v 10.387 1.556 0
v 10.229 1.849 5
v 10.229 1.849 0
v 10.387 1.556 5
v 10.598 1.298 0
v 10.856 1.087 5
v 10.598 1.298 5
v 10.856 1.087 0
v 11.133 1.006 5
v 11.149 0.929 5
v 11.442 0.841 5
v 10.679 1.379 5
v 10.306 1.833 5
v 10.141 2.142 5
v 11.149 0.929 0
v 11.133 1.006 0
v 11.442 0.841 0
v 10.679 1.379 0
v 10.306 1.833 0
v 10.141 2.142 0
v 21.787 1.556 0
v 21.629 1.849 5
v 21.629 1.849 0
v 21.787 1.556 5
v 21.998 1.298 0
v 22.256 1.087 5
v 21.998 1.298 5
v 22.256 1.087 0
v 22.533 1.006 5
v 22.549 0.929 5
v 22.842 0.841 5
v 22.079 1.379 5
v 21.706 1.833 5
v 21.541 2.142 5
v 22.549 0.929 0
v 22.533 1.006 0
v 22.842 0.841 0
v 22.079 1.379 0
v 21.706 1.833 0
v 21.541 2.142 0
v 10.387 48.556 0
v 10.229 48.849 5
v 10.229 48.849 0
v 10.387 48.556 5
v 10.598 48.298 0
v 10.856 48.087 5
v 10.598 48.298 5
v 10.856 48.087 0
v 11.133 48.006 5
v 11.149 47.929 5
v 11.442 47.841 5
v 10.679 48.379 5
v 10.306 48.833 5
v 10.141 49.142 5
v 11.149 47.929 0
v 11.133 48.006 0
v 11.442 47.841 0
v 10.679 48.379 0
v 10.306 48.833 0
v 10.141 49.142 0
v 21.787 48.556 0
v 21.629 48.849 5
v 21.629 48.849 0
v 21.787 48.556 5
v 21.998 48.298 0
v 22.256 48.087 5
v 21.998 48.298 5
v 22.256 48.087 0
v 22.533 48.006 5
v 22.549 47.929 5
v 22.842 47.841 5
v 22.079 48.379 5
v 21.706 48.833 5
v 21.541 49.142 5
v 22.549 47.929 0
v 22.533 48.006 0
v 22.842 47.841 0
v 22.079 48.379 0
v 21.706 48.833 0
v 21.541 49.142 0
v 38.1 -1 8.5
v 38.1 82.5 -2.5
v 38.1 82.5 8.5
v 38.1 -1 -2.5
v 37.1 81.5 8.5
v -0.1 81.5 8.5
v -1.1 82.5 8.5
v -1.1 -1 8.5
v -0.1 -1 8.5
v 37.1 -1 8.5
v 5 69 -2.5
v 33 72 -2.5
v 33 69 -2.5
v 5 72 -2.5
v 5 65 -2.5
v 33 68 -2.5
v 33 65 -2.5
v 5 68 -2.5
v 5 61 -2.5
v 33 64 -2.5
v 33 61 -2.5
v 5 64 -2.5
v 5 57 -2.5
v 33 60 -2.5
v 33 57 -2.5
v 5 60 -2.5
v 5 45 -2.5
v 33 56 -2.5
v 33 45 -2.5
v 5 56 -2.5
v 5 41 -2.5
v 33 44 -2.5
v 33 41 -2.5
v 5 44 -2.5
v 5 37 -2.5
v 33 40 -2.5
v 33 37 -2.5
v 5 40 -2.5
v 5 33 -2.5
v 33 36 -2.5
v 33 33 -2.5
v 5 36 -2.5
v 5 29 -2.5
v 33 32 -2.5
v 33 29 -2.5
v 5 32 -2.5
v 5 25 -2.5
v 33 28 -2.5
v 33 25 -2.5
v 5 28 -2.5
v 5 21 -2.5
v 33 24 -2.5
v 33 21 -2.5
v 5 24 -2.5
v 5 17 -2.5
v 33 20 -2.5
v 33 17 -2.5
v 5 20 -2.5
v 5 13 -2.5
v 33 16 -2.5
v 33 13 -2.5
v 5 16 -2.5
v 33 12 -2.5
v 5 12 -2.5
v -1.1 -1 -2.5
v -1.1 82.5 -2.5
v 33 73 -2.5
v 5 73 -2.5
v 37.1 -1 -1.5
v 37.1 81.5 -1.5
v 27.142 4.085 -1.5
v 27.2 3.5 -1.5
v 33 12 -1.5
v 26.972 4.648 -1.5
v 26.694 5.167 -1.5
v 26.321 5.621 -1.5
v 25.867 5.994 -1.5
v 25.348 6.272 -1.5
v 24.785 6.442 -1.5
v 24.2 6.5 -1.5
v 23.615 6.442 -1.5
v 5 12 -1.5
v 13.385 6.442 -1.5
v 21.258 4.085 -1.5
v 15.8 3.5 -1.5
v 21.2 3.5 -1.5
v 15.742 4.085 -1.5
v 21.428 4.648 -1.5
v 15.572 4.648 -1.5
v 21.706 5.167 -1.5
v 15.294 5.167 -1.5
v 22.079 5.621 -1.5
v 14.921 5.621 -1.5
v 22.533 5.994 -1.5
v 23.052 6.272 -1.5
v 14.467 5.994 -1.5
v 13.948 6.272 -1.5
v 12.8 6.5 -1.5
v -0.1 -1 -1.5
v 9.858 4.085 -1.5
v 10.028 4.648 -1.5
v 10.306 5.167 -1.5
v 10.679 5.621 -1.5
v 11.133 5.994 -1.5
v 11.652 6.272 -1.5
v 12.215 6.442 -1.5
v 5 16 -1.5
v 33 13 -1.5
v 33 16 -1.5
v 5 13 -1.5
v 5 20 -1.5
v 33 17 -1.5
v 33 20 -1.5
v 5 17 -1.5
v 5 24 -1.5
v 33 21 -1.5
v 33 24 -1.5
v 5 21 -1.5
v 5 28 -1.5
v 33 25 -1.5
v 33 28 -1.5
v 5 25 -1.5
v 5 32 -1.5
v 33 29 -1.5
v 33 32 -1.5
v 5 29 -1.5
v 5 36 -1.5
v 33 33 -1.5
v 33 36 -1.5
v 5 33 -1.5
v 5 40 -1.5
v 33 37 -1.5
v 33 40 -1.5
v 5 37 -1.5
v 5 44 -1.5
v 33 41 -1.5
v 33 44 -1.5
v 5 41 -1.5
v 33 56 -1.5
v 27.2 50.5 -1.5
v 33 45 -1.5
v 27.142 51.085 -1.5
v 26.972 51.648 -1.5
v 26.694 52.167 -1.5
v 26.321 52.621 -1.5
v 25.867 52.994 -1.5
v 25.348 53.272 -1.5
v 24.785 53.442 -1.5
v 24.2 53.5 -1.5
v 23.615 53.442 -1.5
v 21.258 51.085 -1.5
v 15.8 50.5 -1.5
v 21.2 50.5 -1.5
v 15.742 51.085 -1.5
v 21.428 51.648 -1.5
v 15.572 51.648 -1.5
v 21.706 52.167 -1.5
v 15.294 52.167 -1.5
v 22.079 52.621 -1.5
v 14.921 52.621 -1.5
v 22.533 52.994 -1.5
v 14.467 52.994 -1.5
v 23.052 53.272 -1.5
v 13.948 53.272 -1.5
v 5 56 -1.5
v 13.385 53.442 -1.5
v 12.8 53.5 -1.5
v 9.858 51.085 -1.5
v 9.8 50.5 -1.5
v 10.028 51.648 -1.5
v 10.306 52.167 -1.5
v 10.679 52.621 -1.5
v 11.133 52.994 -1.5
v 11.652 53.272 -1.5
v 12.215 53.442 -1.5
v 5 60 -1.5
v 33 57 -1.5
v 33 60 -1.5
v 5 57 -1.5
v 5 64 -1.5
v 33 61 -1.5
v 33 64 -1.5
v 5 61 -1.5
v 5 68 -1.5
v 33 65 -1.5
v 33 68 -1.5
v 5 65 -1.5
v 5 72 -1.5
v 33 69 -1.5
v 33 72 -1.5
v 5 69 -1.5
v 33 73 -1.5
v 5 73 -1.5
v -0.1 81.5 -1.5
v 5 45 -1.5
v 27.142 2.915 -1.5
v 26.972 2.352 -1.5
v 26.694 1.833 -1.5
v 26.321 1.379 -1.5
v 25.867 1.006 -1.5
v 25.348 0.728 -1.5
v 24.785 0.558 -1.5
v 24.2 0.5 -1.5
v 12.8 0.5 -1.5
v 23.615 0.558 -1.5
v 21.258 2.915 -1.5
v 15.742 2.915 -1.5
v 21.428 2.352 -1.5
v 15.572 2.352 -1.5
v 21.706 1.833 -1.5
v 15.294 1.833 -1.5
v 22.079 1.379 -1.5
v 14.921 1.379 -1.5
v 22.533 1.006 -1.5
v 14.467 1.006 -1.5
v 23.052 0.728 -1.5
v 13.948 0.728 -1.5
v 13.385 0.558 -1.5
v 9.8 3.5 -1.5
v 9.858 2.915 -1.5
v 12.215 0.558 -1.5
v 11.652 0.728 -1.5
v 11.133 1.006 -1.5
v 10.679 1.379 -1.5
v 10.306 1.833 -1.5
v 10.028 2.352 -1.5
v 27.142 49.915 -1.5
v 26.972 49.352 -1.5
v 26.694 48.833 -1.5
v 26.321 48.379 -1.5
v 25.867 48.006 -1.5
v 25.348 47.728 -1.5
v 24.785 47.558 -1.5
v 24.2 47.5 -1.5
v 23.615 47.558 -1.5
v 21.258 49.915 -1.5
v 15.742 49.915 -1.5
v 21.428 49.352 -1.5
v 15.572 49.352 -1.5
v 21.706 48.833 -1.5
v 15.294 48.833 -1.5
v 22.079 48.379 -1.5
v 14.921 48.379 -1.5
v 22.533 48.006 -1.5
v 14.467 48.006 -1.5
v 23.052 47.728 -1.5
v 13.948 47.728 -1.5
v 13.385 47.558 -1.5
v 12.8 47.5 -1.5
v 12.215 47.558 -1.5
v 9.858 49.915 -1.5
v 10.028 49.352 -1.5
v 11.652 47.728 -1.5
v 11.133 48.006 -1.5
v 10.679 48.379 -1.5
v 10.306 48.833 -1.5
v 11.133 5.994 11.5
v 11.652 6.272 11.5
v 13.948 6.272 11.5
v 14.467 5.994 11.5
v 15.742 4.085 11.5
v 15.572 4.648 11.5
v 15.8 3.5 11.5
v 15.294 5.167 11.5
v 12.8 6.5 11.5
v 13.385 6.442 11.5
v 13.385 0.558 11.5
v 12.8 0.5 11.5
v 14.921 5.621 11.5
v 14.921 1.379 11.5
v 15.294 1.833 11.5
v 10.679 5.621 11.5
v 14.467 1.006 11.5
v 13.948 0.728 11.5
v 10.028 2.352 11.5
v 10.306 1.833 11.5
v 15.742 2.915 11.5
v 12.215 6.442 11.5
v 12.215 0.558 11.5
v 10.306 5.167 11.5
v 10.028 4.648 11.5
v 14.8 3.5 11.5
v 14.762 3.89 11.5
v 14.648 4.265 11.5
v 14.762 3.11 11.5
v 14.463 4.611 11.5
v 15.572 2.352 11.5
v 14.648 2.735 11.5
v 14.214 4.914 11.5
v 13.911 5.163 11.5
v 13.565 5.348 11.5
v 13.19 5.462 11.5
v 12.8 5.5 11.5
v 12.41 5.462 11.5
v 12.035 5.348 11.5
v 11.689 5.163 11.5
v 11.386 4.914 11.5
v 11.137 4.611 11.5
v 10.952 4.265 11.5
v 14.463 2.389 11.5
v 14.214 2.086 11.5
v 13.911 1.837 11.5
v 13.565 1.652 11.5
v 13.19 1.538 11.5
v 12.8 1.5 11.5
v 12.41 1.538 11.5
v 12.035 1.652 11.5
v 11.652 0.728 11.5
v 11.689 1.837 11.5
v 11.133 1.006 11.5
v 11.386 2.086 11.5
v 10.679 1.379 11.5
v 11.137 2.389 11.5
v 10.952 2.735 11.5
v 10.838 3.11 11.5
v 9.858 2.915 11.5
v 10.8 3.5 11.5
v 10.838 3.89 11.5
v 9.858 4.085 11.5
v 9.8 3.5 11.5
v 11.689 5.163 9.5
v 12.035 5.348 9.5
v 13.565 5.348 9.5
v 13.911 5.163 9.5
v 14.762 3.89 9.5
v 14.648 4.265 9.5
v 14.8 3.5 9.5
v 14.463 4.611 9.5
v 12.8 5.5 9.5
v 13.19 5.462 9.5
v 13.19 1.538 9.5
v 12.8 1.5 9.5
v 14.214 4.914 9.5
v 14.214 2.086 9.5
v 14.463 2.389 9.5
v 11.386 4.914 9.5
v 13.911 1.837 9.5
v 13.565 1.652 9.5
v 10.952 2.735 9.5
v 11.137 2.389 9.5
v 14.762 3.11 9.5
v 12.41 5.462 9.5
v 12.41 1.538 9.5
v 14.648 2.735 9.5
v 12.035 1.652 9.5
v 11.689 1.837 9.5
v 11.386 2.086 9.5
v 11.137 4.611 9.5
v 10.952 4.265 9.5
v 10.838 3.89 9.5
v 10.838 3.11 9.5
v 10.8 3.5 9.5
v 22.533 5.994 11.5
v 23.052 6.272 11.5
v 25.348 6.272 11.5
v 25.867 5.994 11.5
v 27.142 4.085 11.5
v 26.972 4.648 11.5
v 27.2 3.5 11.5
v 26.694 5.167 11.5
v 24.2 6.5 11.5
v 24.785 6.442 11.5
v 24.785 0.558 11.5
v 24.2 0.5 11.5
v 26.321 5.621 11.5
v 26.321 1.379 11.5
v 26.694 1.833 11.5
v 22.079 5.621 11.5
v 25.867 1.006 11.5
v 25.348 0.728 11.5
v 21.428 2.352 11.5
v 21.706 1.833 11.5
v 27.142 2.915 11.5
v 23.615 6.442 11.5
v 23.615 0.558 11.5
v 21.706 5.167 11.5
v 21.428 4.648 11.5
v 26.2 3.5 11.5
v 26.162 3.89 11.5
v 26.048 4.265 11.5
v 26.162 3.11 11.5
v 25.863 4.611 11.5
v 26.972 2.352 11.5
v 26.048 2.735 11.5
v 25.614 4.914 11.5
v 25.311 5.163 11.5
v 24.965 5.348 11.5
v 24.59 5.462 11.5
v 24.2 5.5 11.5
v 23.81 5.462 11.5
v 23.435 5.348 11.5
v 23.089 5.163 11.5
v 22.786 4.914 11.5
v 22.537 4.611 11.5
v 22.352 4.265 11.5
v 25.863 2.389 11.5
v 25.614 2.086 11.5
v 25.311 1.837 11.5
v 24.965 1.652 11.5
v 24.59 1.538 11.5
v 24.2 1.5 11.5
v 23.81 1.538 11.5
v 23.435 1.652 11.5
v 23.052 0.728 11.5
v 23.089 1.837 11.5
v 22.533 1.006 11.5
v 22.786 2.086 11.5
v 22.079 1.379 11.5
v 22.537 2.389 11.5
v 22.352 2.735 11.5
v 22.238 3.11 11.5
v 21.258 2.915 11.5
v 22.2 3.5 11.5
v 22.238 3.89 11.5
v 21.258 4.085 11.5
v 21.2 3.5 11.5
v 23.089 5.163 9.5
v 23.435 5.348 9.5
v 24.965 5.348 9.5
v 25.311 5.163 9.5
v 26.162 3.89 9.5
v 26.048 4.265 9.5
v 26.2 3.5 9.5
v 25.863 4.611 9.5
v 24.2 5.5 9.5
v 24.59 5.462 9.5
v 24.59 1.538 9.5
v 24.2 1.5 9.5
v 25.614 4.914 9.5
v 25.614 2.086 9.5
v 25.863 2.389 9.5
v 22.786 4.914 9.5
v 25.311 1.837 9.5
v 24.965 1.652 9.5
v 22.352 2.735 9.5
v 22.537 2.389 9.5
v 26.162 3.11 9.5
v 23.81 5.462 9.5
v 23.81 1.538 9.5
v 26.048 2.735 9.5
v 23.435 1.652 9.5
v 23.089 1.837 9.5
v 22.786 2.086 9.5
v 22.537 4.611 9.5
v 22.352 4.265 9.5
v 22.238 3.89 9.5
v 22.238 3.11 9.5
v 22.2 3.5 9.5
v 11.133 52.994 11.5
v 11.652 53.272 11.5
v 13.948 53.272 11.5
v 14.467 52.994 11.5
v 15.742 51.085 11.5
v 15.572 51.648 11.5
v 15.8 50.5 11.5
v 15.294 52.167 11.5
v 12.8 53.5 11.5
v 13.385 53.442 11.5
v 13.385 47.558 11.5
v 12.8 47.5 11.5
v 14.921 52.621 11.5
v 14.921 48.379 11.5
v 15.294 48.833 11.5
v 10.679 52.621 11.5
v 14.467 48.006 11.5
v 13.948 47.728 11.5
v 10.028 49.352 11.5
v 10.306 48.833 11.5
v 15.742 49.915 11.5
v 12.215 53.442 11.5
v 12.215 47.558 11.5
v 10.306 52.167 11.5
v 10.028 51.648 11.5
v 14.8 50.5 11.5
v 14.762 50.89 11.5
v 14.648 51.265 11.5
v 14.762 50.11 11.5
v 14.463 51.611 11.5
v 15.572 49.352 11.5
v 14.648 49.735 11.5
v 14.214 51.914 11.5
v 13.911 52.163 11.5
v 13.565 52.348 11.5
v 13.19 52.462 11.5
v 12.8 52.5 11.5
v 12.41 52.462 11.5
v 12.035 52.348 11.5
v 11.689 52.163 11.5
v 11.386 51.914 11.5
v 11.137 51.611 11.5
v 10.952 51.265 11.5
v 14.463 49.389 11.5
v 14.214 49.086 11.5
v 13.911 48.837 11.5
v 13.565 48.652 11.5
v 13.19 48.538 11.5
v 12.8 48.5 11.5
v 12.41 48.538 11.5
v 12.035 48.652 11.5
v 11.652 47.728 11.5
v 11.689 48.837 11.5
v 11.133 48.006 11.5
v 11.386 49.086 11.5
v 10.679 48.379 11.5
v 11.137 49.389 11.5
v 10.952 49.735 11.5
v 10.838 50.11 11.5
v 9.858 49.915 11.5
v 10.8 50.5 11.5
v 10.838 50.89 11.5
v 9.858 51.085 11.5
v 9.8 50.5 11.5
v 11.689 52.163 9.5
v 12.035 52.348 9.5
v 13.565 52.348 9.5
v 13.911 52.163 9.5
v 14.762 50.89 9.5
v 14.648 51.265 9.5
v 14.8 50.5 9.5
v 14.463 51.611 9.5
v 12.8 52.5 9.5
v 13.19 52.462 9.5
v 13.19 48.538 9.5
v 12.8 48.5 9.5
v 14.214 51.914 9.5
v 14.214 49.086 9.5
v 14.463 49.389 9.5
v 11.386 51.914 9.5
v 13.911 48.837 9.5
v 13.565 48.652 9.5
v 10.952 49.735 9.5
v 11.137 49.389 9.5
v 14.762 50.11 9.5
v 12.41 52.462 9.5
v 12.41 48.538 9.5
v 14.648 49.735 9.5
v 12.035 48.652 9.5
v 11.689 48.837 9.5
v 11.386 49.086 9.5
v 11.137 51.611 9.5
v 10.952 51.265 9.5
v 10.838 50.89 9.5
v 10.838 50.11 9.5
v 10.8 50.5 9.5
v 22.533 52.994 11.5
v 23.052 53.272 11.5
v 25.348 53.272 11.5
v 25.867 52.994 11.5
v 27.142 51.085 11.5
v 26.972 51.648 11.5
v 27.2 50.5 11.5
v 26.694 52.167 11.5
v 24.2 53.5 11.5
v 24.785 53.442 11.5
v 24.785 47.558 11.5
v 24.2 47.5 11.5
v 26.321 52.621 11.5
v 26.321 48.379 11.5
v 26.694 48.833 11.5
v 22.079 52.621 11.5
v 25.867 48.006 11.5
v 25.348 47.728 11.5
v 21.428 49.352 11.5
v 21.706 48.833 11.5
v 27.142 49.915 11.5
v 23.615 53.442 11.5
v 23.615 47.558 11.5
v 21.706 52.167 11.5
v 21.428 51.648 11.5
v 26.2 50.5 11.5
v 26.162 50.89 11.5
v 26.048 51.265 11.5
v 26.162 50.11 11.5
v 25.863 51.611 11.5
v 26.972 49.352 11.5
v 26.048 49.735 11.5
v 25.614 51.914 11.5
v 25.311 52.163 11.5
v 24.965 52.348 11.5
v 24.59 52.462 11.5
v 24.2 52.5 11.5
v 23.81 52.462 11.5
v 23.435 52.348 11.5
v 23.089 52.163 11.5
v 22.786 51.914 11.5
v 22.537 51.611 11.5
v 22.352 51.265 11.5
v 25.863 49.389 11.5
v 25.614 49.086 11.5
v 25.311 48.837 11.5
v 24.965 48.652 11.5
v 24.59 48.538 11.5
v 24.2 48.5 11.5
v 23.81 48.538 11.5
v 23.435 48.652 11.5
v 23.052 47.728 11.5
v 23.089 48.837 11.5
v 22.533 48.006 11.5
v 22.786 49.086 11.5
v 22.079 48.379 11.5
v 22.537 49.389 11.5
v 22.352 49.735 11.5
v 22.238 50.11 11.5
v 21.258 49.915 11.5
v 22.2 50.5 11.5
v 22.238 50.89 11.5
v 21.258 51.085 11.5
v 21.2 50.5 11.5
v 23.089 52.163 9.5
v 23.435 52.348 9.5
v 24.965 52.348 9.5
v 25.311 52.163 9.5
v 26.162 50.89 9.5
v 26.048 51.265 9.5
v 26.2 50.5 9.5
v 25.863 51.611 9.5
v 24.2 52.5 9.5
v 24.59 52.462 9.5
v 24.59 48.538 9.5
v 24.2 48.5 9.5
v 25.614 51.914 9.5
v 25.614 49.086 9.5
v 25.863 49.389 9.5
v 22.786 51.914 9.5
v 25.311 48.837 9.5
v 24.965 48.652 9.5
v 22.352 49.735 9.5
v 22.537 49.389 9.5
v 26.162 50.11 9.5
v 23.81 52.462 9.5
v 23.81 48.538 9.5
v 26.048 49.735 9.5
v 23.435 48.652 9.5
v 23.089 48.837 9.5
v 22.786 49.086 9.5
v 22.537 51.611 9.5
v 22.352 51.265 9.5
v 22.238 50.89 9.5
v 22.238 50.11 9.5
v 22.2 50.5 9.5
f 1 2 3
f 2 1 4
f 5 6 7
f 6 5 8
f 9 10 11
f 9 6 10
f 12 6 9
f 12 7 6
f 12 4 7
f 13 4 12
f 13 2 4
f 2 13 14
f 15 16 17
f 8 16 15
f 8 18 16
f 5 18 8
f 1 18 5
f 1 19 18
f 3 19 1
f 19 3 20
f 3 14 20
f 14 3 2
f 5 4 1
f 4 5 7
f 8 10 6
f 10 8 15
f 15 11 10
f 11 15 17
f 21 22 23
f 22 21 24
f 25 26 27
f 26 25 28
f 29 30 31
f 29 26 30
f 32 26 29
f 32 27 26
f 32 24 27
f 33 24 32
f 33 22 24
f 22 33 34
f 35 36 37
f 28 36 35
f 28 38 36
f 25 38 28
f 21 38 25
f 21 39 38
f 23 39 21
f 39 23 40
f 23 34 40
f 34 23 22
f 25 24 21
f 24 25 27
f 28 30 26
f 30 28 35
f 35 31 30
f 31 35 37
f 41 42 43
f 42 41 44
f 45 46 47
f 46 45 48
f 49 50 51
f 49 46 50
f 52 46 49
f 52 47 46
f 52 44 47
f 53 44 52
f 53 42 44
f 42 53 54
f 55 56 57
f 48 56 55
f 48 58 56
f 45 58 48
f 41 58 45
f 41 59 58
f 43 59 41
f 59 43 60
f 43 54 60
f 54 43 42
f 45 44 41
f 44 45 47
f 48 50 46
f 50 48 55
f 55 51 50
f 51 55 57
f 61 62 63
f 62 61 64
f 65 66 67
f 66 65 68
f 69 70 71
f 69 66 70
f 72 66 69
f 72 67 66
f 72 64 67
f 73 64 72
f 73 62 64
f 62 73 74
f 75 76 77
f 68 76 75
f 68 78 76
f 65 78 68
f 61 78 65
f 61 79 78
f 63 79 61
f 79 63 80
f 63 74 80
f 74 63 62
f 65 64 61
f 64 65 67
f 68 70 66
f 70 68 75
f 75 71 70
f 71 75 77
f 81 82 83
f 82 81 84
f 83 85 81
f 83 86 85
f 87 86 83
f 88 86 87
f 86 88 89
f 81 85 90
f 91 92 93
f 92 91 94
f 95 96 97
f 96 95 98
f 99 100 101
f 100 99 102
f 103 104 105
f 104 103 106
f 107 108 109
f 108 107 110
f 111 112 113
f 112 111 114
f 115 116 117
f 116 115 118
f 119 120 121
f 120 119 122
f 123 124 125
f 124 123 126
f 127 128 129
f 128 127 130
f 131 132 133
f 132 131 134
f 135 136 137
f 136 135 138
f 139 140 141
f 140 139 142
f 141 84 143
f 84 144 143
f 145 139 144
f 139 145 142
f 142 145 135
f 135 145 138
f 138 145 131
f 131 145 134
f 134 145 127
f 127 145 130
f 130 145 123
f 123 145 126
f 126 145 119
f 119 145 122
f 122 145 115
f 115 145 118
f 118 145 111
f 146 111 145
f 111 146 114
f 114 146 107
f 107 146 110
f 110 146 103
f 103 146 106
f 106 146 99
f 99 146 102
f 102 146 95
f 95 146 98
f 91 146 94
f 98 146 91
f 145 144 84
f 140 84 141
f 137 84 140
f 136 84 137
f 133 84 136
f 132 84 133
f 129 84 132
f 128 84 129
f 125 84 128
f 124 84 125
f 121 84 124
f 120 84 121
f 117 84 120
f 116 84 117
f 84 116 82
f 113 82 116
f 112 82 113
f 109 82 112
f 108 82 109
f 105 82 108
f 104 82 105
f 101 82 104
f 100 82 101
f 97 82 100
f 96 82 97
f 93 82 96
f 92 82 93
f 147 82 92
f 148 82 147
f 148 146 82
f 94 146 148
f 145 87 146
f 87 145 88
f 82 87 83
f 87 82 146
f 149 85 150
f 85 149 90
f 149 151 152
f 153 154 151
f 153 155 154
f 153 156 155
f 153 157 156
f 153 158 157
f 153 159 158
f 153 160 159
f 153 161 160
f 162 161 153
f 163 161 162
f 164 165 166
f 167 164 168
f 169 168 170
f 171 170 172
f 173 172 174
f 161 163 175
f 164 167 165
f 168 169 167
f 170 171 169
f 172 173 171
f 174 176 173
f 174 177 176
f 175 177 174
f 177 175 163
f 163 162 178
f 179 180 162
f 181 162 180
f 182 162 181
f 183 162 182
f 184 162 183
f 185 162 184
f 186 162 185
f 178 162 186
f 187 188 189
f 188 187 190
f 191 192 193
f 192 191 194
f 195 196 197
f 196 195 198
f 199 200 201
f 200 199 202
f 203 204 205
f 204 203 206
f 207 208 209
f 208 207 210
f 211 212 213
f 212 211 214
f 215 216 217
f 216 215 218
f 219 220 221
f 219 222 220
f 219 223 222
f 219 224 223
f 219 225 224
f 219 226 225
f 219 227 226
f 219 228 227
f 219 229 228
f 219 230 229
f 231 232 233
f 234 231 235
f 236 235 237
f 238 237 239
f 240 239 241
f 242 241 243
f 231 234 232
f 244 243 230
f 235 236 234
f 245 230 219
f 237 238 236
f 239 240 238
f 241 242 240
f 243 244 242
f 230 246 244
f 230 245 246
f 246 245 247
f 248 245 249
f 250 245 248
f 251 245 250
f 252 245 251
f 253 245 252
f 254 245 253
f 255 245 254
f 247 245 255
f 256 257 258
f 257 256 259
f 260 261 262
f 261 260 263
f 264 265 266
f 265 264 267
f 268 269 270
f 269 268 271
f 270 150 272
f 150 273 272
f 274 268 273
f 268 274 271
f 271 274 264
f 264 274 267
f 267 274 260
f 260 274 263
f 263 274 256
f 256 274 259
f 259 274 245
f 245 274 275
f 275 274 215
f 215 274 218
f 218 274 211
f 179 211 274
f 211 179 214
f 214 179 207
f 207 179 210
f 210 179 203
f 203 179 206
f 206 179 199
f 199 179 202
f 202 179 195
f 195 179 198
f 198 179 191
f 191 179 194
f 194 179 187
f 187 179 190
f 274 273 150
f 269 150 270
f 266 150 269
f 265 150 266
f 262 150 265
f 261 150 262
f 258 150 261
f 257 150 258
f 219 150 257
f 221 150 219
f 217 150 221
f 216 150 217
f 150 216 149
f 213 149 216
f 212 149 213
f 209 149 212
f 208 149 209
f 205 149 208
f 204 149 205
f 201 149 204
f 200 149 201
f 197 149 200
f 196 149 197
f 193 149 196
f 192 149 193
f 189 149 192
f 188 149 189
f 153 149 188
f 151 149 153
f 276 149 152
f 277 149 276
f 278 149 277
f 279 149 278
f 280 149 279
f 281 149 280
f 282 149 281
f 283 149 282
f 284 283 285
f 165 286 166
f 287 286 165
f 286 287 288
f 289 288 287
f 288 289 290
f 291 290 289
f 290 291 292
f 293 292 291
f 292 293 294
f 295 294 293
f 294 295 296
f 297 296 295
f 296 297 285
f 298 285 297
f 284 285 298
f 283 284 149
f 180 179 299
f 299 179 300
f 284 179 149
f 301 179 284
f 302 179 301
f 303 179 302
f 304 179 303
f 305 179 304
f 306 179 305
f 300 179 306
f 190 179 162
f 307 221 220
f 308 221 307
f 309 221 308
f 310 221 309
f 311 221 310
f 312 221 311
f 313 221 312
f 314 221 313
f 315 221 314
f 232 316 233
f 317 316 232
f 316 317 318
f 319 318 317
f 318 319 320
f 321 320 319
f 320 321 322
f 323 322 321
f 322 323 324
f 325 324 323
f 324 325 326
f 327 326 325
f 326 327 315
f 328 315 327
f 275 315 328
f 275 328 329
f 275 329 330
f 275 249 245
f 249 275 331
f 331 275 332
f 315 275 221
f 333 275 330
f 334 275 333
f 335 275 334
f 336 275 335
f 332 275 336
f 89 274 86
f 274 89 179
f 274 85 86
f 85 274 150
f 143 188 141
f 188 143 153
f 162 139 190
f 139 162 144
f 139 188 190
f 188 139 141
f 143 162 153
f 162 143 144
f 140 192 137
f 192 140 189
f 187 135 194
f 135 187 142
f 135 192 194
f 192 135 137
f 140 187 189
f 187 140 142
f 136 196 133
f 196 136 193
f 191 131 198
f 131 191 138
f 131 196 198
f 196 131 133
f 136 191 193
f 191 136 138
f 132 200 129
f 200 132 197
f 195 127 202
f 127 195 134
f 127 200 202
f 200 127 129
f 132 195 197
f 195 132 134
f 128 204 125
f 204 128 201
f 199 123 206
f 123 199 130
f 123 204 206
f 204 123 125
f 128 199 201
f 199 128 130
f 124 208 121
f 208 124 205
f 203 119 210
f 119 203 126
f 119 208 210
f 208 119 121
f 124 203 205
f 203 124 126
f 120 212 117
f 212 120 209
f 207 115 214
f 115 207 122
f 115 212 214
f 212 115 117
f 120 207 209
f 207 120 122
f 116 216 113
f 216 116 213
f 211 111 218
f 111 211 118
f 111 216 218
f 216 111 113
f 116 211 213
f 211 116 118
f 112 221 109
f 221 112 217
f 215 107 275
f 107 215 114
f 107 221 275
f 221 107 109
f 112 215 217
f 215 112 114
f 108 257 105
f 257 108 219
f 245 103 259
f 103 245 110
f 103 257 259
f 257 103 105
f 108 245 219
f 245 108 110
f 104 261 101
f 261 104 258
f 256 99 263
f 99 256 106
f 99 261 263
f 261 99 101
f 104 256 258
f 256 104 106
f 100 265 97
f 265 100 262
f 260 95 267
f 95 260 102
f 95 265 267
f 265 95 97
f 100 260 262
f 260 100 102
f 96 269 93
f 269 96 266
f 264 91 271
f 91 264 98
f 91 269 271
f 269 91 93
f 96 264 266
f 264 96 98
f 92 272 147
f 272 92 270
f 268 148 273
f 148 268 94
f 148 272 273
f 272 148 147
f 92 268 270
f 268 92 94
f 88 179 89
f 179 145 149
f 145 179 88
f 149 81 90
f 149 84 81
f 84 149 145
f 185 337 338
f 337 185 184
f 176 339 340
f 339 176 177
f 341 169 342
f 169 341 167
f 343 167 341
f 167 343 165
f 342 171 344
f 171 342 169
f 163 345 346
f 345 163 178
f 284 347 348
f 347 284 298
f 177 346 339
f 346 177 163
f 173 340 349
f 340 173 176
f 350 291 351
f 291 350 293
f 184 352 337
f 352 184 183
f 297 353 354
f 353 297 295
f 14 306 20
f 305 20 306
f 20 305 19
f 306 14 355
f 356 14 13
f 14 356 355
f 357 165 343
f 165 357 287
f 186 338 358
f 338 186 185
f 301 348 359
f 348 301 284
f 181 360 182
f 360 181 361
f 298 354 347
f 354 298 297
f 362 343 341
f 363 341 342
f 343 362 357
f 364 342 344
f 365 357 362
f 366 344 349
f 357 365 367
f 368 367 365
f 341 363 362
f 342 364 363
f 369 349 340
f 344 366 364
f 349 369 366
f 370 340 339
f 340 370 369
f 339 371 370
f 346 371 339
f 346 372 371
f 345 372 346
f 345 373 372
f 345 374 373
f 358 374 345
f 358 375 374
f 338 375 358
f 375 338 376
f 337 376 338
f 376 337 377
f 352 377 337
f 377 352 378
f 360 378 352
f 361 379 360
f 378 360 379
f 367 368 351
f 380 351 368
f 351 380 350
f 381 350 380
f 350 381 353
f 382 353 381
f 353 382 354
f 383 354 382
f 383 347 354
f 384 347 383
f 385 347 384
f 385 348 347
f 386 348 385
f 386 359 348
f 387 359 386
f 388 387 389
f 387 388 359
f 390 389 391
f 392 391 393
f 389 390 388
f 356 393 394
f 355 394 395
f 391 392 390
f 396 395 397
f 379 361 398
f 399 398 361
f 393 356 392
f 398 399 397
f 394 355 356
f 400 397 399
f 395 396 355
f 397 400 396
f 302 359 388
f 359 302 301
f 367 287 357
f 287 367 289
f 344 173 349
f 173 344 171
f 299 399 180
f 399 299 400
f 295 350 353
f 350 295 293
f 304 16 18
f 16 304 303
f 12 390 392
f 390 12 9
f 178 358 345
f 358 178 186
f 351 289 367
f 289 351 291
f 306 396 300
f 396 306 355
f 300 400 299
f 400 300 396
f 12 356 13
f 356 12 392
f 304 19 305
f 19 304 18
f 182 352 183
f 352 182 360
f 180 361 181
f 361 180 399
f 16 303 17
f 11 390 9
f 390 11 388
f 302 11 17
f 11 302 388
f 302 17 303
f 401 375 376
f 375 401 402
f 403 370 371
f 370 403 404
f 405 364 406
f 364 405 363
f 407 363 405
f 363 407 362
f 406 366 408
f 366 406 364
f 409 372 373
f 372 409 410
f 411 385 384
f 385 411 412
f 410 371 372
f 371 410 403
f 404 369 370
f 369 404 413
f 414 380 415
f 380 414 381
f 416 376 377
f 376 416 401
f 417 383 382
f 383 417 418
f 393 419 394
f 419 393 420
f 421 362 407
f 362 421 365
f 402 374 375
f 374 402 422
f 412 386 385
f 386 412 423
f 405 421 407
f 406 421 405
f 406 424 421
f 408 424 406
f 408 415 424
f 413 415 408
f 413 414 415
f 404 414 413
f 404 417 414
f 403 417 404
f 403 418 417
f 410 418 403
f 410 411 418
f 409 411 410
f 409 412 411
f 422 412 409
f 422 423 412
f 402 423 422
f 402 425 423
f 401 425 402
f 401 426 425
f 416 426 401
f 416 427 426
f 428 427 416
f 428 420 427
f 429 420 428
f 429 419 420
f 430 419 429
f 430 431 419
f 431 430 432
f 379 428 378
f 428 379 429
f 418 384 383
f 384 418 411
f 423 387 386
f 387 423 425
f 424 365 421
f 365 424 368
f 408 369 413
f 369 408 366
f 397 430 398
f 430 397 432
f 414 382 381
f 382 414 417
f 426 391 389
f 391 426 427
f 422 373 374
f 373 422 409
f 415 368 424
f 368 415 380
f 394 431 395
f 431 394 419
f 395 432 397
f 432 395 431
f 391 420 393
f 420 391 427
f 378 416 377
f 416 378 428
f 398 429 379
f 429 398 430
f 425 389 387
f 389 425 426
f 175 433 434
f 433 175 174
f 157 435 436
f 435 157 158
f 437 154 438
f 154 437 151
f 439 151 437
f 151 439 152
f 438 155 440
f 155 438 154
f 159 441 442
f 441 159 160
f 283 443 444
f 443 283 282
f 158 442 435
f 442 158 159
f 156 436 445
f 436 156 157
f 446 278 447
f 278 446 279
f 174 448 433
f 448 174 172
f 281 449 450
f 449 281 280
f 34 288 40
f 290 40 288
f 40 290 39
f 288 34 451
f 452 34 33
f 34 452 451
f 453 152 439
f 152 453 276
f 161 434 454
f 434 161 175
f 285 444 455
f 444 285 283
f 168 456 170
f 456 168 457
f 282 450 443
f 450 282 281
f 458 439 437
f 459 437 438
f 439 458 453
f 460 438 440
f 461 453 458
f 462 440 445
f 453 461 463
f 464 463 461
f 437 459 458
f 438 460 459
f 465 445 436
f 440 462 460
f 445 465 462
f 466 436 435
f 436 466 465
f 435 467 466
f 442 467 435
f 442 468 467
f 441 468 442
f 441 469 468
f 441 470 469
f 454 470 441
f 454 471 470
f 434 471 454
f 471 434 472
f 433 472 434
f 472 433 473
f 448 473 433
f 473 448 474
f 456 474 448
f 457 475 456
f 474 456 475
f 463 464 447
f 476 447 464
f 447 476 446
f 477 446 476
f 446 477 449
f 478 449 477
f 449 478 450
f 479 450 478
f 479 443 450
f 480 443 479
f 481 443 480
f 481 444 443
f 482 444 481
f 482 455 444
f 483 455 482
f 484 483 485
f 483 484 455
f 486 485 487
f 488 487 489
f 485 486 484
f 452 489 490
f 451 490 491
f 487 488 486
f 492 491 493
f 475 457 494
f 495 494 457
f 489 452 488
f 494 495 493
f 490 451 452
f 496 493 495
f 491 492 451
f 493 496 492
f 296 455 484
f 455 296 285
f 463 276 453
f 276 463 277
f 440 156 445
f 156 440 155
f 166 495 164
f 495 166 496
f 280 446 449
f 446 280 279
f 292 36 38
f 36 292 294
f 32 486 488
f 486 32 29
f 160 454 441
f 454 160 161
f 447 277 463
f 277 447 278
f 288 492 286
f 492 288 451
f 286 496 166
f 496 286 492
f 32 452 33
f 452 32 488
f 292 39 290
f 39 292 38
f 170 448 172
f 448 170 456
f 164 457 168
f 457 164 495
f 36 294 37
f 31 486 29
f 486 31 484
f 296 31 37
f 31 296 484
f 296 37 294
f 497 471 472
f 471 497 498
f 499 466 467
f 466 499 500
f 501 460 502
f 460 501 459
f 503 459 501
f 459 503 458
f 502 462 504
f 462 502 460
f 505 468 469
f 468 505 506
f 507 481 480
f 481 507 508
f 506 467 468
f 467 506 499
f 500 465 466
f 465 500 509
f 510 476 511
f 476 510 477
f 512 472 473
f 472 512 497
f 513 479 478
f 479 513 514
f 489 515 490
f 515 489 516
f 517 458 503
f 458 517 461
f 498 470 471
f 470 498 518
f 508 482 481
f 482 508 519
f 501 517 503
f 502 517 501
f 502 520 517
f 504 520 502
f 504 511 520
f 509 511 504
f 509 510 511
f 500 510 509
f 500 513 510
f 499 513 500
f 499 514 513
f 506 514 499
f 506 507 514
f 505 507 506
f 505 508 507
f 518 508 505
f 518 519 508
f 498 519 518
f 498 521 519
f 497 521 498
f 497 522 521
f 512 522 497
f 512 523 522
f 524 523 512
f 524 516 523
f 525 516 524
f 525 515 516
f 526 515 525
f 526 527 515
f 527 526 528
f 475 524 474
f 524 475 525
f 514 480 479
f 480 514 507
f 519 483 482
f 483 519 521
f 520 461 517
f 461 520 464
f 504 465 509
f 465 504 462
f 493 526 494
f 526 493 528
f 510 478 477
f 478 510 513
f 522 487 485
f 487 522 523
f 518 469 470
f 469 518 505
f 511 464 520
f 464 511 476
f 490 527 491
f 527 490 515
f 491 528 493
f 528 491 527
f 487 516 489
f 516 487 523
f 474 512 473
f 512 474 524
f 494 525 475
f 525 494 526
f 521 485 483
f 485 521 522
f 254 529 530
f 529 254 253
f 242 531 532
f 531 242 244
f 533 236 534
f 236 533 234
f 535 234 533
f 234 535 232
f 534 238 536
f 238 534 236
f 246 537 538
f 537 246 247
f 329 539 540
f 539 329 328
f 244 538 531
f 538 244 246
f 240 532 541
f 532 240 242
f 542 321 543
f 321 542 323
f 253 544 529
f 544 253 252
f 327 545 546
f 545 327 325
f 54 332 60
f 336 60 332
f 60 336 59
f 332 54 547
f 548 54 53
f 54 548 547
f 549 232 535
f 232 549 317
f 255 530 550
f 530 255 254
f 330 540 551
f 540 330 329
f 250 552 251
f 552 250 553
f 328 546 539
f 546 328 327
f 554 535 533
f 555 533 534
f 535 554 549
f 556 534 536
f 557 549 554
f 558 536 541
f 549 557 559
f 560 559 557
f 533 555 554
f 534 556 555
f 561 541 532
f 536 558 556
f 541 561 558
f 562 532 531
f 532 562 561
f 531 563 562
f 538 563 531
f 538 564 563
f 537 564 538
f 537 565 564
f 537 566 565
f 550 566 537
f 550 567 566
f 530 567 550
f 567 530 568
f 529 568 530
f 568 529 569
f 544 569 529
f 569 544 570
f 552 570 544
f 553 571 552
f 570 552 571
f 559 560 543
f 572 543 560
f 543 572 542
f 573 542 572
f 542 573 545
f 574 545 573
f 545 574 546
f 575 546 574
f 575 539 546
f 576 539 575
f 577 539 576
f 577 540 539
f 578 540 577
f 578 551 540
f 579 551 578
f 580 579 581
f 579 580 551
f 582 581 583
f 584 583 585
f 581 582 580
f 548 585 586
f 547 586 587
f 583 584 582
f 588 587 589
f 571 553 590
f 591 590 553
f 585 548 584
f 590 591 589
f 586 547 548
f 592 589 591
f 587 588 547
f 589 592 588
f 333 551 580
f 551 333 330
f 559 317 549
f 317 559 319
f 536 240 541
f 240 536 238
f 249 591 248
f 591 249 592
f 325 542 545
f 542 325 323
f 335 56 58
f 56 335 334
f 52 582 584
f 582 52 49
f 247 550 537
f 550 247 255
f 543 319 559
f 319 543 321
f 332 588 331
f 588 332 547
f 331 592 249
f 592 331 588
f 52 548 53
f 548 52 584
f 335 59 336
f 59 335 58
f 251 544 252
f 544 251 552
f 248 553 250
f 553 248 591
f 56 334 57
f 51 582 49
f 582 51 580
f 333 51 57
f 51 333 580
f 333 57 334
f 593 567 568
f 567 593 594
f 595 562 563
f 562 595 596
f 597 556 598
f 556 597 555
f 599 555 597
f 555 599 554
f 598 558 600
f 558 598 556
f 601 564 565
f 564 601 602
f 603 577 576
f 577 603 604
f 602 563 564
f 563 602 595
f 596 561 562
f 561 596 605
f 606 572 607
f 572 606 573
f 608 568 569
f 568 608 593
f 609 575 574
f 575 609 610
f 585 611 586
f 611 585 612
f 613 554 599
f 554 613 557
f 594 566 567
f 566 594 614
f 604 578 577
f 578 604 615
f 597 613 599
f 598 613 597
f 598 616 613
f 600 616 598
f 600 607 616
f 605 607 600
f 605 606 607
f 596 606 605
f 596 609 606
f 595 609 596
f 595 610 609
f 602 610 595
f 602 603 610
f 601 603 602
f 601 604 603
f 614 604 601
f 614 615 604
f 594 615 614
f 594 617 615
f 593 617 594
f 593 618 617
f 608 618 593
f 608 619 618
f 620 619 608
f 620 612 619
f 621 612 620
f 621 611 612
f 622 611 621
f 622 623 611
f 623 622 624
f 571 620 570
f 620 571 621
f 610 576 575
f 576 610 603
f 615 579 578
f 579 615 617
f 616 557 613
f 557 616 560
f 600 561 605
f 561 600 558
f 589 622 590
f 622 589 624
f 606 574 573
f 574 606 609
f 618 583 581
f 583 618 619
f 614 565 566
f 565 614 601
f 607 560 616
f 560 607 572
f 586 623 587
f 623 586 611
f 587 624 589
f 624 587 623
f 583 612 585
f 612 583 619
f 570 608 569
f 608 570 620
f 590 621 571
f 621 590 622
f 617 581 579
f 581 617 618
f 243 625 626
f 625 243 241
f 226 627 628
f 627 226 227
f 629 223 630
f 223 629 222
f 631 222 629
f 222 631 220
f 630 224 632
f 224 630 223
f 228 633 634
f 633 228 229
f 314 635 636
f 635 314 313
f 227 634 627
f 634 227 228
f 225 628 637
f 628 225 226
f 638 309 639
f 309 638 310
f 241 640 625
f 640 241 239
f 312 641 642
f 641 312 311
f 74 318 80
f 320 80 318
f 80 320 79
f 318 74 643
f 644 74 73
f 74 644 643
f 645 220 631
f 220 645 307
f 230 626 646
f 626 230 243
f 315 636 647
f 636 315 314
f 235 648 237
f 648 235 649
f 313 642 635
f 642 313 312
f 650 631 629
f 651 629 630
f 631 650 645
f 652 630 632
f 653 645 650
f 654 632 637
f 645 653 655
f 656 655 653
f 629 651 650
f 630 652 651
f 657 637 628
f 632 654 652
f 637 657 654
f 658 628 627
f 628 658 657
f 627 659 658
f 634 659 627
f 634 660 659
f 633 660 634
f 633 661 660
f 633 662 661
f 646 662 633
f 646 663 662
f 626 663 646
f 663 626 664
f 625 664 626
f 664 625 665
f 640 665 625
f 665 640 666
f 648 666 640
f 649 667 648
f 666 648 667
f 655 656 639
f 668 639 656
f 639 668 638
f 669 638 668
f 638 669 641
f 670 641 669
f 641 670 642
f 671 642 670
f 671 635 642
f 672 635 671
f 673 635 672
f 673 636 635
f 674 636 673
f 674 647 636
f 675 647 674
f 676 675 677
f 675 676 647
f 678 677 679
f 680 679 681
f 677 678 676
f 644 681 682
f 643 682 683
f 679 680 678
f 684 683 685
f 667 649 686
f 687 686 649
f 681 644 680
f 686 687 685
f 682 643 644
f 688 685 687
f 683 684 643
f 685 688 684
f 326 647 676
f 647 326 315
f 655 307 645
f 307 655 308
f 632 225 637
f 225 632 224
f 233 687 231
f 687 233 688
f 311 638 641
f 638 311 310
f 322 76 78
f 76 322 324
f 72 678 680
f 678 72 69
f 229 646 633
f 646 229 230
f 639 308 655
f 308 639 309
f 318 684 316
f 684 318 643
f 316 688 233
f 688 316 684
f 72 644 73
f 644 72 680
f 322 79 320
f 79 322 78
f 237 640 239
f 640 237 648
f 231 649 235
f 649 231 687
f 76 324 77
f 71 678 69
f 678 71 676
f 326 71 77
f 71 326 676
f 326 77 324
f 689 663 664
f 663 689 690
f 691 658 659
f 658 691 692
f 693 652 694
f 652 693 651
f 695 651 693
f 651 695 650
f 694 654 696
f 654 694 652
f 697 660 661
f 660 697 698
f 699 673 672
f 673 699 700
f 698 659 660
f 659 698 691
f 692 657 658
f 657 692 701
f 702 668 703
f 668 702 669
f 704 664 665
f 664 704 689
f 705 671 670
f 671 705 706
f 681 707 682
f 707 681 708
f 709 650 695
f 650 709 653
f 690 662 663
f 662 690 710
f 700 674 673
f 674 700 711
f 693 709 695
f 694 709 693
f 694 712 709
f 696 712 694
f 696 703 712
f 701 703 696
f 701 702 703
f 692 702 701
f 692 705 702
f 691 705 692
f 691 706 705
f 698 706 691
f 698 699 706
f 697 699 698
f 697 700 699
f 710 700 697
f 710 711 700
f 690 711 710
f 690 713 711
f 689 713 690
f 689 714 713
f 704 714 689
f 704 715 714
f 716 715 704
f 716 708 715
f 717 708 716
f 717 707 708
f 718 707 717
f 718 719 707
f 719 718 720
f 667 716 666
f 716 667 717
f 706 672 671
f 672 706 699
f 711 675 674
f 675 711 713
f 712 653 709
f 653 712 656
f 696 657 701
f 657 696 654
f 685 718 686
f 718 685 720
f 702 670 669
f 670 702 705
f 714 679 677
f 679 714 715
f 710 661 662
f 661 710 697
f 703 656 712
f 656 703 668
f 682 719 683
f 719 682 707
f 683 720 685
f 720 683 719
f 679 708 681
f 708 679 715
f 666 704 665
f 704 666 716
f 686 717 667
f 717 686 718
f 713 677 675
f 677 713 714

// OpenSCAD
// file: generic.scad
module myBox(x,y,z,w,d,h) 
{
    translate([x-1,y-1,z-1])
    difference() {
        cube([w+2, d+2, h+1]);
        translate([1, 1, 1])
            cube([w, d, h]);
    }
}

module stud(x,y,z, radius, h)
{
    translate([x,y,z])
    union() {
        cylinder(h, radius + 0.7, radius+0.7);
        translate([0,0, h])
        cylinder(3, radius, radius);        
    }
}

module studHole(x,y,z, radius, h)
{
    translate([x,y,z])
    difference() {
        cylinder(h, radius + 1, radius+1);
        translate([0,0,h-2])
        cylinder(2, radius, radius);
    }    
}
// main file
$fn=32;

use <generic.scad>;

module picoStuds(x,y,z)
{
    translate([x,y,z])
    union() {
        stud(4.8, 2, 0, 1, 5);
        stud(16.2, 2, 0, 1, 5);
        stud(4.8, 49, 0, 1, 5);
        stud(16.2, 49, 0, 1, 5);
    }
}

module picoStudHoles(x,y,z, h)
{
    translate([x+1,y+1,z])
    union() {
        studHole(4.8, 2, 0, 2, h);
        studHole(16.2, 2, 0, 2, h);
        studHole(4.8, 49, 0, 2, h);
        studHole(16.2, 49, 0, 2, h);
    }
}

*difference() {
    myBox(0,0,0,35,80,15);
    translate([17.5, 0, 15])
        cube([8,6,24], center=true);
    translate([17.5, 5, 9])    
        rotate([90,0,0])
            cylinder(10, 3, 3);
}
picoStuds(7,0.5,0);

difference() {    
    myBox(-0.1,-1.5,-1.5,37.2,83, 10);
    translate([-2,-4, -4 ]) cube([140, 3, 100], center = false);
    for (a = [0:8]) {
        translate([5, a* 4 + 12, -3]) cube([28,1,6]);
    }
    for (a = [11:15]) {
        translate([5, a* 4 + 12, -3]) cube([28,1,6]);
    }
}

picoStudHoles(7, 0.5, -1.5, 13);
